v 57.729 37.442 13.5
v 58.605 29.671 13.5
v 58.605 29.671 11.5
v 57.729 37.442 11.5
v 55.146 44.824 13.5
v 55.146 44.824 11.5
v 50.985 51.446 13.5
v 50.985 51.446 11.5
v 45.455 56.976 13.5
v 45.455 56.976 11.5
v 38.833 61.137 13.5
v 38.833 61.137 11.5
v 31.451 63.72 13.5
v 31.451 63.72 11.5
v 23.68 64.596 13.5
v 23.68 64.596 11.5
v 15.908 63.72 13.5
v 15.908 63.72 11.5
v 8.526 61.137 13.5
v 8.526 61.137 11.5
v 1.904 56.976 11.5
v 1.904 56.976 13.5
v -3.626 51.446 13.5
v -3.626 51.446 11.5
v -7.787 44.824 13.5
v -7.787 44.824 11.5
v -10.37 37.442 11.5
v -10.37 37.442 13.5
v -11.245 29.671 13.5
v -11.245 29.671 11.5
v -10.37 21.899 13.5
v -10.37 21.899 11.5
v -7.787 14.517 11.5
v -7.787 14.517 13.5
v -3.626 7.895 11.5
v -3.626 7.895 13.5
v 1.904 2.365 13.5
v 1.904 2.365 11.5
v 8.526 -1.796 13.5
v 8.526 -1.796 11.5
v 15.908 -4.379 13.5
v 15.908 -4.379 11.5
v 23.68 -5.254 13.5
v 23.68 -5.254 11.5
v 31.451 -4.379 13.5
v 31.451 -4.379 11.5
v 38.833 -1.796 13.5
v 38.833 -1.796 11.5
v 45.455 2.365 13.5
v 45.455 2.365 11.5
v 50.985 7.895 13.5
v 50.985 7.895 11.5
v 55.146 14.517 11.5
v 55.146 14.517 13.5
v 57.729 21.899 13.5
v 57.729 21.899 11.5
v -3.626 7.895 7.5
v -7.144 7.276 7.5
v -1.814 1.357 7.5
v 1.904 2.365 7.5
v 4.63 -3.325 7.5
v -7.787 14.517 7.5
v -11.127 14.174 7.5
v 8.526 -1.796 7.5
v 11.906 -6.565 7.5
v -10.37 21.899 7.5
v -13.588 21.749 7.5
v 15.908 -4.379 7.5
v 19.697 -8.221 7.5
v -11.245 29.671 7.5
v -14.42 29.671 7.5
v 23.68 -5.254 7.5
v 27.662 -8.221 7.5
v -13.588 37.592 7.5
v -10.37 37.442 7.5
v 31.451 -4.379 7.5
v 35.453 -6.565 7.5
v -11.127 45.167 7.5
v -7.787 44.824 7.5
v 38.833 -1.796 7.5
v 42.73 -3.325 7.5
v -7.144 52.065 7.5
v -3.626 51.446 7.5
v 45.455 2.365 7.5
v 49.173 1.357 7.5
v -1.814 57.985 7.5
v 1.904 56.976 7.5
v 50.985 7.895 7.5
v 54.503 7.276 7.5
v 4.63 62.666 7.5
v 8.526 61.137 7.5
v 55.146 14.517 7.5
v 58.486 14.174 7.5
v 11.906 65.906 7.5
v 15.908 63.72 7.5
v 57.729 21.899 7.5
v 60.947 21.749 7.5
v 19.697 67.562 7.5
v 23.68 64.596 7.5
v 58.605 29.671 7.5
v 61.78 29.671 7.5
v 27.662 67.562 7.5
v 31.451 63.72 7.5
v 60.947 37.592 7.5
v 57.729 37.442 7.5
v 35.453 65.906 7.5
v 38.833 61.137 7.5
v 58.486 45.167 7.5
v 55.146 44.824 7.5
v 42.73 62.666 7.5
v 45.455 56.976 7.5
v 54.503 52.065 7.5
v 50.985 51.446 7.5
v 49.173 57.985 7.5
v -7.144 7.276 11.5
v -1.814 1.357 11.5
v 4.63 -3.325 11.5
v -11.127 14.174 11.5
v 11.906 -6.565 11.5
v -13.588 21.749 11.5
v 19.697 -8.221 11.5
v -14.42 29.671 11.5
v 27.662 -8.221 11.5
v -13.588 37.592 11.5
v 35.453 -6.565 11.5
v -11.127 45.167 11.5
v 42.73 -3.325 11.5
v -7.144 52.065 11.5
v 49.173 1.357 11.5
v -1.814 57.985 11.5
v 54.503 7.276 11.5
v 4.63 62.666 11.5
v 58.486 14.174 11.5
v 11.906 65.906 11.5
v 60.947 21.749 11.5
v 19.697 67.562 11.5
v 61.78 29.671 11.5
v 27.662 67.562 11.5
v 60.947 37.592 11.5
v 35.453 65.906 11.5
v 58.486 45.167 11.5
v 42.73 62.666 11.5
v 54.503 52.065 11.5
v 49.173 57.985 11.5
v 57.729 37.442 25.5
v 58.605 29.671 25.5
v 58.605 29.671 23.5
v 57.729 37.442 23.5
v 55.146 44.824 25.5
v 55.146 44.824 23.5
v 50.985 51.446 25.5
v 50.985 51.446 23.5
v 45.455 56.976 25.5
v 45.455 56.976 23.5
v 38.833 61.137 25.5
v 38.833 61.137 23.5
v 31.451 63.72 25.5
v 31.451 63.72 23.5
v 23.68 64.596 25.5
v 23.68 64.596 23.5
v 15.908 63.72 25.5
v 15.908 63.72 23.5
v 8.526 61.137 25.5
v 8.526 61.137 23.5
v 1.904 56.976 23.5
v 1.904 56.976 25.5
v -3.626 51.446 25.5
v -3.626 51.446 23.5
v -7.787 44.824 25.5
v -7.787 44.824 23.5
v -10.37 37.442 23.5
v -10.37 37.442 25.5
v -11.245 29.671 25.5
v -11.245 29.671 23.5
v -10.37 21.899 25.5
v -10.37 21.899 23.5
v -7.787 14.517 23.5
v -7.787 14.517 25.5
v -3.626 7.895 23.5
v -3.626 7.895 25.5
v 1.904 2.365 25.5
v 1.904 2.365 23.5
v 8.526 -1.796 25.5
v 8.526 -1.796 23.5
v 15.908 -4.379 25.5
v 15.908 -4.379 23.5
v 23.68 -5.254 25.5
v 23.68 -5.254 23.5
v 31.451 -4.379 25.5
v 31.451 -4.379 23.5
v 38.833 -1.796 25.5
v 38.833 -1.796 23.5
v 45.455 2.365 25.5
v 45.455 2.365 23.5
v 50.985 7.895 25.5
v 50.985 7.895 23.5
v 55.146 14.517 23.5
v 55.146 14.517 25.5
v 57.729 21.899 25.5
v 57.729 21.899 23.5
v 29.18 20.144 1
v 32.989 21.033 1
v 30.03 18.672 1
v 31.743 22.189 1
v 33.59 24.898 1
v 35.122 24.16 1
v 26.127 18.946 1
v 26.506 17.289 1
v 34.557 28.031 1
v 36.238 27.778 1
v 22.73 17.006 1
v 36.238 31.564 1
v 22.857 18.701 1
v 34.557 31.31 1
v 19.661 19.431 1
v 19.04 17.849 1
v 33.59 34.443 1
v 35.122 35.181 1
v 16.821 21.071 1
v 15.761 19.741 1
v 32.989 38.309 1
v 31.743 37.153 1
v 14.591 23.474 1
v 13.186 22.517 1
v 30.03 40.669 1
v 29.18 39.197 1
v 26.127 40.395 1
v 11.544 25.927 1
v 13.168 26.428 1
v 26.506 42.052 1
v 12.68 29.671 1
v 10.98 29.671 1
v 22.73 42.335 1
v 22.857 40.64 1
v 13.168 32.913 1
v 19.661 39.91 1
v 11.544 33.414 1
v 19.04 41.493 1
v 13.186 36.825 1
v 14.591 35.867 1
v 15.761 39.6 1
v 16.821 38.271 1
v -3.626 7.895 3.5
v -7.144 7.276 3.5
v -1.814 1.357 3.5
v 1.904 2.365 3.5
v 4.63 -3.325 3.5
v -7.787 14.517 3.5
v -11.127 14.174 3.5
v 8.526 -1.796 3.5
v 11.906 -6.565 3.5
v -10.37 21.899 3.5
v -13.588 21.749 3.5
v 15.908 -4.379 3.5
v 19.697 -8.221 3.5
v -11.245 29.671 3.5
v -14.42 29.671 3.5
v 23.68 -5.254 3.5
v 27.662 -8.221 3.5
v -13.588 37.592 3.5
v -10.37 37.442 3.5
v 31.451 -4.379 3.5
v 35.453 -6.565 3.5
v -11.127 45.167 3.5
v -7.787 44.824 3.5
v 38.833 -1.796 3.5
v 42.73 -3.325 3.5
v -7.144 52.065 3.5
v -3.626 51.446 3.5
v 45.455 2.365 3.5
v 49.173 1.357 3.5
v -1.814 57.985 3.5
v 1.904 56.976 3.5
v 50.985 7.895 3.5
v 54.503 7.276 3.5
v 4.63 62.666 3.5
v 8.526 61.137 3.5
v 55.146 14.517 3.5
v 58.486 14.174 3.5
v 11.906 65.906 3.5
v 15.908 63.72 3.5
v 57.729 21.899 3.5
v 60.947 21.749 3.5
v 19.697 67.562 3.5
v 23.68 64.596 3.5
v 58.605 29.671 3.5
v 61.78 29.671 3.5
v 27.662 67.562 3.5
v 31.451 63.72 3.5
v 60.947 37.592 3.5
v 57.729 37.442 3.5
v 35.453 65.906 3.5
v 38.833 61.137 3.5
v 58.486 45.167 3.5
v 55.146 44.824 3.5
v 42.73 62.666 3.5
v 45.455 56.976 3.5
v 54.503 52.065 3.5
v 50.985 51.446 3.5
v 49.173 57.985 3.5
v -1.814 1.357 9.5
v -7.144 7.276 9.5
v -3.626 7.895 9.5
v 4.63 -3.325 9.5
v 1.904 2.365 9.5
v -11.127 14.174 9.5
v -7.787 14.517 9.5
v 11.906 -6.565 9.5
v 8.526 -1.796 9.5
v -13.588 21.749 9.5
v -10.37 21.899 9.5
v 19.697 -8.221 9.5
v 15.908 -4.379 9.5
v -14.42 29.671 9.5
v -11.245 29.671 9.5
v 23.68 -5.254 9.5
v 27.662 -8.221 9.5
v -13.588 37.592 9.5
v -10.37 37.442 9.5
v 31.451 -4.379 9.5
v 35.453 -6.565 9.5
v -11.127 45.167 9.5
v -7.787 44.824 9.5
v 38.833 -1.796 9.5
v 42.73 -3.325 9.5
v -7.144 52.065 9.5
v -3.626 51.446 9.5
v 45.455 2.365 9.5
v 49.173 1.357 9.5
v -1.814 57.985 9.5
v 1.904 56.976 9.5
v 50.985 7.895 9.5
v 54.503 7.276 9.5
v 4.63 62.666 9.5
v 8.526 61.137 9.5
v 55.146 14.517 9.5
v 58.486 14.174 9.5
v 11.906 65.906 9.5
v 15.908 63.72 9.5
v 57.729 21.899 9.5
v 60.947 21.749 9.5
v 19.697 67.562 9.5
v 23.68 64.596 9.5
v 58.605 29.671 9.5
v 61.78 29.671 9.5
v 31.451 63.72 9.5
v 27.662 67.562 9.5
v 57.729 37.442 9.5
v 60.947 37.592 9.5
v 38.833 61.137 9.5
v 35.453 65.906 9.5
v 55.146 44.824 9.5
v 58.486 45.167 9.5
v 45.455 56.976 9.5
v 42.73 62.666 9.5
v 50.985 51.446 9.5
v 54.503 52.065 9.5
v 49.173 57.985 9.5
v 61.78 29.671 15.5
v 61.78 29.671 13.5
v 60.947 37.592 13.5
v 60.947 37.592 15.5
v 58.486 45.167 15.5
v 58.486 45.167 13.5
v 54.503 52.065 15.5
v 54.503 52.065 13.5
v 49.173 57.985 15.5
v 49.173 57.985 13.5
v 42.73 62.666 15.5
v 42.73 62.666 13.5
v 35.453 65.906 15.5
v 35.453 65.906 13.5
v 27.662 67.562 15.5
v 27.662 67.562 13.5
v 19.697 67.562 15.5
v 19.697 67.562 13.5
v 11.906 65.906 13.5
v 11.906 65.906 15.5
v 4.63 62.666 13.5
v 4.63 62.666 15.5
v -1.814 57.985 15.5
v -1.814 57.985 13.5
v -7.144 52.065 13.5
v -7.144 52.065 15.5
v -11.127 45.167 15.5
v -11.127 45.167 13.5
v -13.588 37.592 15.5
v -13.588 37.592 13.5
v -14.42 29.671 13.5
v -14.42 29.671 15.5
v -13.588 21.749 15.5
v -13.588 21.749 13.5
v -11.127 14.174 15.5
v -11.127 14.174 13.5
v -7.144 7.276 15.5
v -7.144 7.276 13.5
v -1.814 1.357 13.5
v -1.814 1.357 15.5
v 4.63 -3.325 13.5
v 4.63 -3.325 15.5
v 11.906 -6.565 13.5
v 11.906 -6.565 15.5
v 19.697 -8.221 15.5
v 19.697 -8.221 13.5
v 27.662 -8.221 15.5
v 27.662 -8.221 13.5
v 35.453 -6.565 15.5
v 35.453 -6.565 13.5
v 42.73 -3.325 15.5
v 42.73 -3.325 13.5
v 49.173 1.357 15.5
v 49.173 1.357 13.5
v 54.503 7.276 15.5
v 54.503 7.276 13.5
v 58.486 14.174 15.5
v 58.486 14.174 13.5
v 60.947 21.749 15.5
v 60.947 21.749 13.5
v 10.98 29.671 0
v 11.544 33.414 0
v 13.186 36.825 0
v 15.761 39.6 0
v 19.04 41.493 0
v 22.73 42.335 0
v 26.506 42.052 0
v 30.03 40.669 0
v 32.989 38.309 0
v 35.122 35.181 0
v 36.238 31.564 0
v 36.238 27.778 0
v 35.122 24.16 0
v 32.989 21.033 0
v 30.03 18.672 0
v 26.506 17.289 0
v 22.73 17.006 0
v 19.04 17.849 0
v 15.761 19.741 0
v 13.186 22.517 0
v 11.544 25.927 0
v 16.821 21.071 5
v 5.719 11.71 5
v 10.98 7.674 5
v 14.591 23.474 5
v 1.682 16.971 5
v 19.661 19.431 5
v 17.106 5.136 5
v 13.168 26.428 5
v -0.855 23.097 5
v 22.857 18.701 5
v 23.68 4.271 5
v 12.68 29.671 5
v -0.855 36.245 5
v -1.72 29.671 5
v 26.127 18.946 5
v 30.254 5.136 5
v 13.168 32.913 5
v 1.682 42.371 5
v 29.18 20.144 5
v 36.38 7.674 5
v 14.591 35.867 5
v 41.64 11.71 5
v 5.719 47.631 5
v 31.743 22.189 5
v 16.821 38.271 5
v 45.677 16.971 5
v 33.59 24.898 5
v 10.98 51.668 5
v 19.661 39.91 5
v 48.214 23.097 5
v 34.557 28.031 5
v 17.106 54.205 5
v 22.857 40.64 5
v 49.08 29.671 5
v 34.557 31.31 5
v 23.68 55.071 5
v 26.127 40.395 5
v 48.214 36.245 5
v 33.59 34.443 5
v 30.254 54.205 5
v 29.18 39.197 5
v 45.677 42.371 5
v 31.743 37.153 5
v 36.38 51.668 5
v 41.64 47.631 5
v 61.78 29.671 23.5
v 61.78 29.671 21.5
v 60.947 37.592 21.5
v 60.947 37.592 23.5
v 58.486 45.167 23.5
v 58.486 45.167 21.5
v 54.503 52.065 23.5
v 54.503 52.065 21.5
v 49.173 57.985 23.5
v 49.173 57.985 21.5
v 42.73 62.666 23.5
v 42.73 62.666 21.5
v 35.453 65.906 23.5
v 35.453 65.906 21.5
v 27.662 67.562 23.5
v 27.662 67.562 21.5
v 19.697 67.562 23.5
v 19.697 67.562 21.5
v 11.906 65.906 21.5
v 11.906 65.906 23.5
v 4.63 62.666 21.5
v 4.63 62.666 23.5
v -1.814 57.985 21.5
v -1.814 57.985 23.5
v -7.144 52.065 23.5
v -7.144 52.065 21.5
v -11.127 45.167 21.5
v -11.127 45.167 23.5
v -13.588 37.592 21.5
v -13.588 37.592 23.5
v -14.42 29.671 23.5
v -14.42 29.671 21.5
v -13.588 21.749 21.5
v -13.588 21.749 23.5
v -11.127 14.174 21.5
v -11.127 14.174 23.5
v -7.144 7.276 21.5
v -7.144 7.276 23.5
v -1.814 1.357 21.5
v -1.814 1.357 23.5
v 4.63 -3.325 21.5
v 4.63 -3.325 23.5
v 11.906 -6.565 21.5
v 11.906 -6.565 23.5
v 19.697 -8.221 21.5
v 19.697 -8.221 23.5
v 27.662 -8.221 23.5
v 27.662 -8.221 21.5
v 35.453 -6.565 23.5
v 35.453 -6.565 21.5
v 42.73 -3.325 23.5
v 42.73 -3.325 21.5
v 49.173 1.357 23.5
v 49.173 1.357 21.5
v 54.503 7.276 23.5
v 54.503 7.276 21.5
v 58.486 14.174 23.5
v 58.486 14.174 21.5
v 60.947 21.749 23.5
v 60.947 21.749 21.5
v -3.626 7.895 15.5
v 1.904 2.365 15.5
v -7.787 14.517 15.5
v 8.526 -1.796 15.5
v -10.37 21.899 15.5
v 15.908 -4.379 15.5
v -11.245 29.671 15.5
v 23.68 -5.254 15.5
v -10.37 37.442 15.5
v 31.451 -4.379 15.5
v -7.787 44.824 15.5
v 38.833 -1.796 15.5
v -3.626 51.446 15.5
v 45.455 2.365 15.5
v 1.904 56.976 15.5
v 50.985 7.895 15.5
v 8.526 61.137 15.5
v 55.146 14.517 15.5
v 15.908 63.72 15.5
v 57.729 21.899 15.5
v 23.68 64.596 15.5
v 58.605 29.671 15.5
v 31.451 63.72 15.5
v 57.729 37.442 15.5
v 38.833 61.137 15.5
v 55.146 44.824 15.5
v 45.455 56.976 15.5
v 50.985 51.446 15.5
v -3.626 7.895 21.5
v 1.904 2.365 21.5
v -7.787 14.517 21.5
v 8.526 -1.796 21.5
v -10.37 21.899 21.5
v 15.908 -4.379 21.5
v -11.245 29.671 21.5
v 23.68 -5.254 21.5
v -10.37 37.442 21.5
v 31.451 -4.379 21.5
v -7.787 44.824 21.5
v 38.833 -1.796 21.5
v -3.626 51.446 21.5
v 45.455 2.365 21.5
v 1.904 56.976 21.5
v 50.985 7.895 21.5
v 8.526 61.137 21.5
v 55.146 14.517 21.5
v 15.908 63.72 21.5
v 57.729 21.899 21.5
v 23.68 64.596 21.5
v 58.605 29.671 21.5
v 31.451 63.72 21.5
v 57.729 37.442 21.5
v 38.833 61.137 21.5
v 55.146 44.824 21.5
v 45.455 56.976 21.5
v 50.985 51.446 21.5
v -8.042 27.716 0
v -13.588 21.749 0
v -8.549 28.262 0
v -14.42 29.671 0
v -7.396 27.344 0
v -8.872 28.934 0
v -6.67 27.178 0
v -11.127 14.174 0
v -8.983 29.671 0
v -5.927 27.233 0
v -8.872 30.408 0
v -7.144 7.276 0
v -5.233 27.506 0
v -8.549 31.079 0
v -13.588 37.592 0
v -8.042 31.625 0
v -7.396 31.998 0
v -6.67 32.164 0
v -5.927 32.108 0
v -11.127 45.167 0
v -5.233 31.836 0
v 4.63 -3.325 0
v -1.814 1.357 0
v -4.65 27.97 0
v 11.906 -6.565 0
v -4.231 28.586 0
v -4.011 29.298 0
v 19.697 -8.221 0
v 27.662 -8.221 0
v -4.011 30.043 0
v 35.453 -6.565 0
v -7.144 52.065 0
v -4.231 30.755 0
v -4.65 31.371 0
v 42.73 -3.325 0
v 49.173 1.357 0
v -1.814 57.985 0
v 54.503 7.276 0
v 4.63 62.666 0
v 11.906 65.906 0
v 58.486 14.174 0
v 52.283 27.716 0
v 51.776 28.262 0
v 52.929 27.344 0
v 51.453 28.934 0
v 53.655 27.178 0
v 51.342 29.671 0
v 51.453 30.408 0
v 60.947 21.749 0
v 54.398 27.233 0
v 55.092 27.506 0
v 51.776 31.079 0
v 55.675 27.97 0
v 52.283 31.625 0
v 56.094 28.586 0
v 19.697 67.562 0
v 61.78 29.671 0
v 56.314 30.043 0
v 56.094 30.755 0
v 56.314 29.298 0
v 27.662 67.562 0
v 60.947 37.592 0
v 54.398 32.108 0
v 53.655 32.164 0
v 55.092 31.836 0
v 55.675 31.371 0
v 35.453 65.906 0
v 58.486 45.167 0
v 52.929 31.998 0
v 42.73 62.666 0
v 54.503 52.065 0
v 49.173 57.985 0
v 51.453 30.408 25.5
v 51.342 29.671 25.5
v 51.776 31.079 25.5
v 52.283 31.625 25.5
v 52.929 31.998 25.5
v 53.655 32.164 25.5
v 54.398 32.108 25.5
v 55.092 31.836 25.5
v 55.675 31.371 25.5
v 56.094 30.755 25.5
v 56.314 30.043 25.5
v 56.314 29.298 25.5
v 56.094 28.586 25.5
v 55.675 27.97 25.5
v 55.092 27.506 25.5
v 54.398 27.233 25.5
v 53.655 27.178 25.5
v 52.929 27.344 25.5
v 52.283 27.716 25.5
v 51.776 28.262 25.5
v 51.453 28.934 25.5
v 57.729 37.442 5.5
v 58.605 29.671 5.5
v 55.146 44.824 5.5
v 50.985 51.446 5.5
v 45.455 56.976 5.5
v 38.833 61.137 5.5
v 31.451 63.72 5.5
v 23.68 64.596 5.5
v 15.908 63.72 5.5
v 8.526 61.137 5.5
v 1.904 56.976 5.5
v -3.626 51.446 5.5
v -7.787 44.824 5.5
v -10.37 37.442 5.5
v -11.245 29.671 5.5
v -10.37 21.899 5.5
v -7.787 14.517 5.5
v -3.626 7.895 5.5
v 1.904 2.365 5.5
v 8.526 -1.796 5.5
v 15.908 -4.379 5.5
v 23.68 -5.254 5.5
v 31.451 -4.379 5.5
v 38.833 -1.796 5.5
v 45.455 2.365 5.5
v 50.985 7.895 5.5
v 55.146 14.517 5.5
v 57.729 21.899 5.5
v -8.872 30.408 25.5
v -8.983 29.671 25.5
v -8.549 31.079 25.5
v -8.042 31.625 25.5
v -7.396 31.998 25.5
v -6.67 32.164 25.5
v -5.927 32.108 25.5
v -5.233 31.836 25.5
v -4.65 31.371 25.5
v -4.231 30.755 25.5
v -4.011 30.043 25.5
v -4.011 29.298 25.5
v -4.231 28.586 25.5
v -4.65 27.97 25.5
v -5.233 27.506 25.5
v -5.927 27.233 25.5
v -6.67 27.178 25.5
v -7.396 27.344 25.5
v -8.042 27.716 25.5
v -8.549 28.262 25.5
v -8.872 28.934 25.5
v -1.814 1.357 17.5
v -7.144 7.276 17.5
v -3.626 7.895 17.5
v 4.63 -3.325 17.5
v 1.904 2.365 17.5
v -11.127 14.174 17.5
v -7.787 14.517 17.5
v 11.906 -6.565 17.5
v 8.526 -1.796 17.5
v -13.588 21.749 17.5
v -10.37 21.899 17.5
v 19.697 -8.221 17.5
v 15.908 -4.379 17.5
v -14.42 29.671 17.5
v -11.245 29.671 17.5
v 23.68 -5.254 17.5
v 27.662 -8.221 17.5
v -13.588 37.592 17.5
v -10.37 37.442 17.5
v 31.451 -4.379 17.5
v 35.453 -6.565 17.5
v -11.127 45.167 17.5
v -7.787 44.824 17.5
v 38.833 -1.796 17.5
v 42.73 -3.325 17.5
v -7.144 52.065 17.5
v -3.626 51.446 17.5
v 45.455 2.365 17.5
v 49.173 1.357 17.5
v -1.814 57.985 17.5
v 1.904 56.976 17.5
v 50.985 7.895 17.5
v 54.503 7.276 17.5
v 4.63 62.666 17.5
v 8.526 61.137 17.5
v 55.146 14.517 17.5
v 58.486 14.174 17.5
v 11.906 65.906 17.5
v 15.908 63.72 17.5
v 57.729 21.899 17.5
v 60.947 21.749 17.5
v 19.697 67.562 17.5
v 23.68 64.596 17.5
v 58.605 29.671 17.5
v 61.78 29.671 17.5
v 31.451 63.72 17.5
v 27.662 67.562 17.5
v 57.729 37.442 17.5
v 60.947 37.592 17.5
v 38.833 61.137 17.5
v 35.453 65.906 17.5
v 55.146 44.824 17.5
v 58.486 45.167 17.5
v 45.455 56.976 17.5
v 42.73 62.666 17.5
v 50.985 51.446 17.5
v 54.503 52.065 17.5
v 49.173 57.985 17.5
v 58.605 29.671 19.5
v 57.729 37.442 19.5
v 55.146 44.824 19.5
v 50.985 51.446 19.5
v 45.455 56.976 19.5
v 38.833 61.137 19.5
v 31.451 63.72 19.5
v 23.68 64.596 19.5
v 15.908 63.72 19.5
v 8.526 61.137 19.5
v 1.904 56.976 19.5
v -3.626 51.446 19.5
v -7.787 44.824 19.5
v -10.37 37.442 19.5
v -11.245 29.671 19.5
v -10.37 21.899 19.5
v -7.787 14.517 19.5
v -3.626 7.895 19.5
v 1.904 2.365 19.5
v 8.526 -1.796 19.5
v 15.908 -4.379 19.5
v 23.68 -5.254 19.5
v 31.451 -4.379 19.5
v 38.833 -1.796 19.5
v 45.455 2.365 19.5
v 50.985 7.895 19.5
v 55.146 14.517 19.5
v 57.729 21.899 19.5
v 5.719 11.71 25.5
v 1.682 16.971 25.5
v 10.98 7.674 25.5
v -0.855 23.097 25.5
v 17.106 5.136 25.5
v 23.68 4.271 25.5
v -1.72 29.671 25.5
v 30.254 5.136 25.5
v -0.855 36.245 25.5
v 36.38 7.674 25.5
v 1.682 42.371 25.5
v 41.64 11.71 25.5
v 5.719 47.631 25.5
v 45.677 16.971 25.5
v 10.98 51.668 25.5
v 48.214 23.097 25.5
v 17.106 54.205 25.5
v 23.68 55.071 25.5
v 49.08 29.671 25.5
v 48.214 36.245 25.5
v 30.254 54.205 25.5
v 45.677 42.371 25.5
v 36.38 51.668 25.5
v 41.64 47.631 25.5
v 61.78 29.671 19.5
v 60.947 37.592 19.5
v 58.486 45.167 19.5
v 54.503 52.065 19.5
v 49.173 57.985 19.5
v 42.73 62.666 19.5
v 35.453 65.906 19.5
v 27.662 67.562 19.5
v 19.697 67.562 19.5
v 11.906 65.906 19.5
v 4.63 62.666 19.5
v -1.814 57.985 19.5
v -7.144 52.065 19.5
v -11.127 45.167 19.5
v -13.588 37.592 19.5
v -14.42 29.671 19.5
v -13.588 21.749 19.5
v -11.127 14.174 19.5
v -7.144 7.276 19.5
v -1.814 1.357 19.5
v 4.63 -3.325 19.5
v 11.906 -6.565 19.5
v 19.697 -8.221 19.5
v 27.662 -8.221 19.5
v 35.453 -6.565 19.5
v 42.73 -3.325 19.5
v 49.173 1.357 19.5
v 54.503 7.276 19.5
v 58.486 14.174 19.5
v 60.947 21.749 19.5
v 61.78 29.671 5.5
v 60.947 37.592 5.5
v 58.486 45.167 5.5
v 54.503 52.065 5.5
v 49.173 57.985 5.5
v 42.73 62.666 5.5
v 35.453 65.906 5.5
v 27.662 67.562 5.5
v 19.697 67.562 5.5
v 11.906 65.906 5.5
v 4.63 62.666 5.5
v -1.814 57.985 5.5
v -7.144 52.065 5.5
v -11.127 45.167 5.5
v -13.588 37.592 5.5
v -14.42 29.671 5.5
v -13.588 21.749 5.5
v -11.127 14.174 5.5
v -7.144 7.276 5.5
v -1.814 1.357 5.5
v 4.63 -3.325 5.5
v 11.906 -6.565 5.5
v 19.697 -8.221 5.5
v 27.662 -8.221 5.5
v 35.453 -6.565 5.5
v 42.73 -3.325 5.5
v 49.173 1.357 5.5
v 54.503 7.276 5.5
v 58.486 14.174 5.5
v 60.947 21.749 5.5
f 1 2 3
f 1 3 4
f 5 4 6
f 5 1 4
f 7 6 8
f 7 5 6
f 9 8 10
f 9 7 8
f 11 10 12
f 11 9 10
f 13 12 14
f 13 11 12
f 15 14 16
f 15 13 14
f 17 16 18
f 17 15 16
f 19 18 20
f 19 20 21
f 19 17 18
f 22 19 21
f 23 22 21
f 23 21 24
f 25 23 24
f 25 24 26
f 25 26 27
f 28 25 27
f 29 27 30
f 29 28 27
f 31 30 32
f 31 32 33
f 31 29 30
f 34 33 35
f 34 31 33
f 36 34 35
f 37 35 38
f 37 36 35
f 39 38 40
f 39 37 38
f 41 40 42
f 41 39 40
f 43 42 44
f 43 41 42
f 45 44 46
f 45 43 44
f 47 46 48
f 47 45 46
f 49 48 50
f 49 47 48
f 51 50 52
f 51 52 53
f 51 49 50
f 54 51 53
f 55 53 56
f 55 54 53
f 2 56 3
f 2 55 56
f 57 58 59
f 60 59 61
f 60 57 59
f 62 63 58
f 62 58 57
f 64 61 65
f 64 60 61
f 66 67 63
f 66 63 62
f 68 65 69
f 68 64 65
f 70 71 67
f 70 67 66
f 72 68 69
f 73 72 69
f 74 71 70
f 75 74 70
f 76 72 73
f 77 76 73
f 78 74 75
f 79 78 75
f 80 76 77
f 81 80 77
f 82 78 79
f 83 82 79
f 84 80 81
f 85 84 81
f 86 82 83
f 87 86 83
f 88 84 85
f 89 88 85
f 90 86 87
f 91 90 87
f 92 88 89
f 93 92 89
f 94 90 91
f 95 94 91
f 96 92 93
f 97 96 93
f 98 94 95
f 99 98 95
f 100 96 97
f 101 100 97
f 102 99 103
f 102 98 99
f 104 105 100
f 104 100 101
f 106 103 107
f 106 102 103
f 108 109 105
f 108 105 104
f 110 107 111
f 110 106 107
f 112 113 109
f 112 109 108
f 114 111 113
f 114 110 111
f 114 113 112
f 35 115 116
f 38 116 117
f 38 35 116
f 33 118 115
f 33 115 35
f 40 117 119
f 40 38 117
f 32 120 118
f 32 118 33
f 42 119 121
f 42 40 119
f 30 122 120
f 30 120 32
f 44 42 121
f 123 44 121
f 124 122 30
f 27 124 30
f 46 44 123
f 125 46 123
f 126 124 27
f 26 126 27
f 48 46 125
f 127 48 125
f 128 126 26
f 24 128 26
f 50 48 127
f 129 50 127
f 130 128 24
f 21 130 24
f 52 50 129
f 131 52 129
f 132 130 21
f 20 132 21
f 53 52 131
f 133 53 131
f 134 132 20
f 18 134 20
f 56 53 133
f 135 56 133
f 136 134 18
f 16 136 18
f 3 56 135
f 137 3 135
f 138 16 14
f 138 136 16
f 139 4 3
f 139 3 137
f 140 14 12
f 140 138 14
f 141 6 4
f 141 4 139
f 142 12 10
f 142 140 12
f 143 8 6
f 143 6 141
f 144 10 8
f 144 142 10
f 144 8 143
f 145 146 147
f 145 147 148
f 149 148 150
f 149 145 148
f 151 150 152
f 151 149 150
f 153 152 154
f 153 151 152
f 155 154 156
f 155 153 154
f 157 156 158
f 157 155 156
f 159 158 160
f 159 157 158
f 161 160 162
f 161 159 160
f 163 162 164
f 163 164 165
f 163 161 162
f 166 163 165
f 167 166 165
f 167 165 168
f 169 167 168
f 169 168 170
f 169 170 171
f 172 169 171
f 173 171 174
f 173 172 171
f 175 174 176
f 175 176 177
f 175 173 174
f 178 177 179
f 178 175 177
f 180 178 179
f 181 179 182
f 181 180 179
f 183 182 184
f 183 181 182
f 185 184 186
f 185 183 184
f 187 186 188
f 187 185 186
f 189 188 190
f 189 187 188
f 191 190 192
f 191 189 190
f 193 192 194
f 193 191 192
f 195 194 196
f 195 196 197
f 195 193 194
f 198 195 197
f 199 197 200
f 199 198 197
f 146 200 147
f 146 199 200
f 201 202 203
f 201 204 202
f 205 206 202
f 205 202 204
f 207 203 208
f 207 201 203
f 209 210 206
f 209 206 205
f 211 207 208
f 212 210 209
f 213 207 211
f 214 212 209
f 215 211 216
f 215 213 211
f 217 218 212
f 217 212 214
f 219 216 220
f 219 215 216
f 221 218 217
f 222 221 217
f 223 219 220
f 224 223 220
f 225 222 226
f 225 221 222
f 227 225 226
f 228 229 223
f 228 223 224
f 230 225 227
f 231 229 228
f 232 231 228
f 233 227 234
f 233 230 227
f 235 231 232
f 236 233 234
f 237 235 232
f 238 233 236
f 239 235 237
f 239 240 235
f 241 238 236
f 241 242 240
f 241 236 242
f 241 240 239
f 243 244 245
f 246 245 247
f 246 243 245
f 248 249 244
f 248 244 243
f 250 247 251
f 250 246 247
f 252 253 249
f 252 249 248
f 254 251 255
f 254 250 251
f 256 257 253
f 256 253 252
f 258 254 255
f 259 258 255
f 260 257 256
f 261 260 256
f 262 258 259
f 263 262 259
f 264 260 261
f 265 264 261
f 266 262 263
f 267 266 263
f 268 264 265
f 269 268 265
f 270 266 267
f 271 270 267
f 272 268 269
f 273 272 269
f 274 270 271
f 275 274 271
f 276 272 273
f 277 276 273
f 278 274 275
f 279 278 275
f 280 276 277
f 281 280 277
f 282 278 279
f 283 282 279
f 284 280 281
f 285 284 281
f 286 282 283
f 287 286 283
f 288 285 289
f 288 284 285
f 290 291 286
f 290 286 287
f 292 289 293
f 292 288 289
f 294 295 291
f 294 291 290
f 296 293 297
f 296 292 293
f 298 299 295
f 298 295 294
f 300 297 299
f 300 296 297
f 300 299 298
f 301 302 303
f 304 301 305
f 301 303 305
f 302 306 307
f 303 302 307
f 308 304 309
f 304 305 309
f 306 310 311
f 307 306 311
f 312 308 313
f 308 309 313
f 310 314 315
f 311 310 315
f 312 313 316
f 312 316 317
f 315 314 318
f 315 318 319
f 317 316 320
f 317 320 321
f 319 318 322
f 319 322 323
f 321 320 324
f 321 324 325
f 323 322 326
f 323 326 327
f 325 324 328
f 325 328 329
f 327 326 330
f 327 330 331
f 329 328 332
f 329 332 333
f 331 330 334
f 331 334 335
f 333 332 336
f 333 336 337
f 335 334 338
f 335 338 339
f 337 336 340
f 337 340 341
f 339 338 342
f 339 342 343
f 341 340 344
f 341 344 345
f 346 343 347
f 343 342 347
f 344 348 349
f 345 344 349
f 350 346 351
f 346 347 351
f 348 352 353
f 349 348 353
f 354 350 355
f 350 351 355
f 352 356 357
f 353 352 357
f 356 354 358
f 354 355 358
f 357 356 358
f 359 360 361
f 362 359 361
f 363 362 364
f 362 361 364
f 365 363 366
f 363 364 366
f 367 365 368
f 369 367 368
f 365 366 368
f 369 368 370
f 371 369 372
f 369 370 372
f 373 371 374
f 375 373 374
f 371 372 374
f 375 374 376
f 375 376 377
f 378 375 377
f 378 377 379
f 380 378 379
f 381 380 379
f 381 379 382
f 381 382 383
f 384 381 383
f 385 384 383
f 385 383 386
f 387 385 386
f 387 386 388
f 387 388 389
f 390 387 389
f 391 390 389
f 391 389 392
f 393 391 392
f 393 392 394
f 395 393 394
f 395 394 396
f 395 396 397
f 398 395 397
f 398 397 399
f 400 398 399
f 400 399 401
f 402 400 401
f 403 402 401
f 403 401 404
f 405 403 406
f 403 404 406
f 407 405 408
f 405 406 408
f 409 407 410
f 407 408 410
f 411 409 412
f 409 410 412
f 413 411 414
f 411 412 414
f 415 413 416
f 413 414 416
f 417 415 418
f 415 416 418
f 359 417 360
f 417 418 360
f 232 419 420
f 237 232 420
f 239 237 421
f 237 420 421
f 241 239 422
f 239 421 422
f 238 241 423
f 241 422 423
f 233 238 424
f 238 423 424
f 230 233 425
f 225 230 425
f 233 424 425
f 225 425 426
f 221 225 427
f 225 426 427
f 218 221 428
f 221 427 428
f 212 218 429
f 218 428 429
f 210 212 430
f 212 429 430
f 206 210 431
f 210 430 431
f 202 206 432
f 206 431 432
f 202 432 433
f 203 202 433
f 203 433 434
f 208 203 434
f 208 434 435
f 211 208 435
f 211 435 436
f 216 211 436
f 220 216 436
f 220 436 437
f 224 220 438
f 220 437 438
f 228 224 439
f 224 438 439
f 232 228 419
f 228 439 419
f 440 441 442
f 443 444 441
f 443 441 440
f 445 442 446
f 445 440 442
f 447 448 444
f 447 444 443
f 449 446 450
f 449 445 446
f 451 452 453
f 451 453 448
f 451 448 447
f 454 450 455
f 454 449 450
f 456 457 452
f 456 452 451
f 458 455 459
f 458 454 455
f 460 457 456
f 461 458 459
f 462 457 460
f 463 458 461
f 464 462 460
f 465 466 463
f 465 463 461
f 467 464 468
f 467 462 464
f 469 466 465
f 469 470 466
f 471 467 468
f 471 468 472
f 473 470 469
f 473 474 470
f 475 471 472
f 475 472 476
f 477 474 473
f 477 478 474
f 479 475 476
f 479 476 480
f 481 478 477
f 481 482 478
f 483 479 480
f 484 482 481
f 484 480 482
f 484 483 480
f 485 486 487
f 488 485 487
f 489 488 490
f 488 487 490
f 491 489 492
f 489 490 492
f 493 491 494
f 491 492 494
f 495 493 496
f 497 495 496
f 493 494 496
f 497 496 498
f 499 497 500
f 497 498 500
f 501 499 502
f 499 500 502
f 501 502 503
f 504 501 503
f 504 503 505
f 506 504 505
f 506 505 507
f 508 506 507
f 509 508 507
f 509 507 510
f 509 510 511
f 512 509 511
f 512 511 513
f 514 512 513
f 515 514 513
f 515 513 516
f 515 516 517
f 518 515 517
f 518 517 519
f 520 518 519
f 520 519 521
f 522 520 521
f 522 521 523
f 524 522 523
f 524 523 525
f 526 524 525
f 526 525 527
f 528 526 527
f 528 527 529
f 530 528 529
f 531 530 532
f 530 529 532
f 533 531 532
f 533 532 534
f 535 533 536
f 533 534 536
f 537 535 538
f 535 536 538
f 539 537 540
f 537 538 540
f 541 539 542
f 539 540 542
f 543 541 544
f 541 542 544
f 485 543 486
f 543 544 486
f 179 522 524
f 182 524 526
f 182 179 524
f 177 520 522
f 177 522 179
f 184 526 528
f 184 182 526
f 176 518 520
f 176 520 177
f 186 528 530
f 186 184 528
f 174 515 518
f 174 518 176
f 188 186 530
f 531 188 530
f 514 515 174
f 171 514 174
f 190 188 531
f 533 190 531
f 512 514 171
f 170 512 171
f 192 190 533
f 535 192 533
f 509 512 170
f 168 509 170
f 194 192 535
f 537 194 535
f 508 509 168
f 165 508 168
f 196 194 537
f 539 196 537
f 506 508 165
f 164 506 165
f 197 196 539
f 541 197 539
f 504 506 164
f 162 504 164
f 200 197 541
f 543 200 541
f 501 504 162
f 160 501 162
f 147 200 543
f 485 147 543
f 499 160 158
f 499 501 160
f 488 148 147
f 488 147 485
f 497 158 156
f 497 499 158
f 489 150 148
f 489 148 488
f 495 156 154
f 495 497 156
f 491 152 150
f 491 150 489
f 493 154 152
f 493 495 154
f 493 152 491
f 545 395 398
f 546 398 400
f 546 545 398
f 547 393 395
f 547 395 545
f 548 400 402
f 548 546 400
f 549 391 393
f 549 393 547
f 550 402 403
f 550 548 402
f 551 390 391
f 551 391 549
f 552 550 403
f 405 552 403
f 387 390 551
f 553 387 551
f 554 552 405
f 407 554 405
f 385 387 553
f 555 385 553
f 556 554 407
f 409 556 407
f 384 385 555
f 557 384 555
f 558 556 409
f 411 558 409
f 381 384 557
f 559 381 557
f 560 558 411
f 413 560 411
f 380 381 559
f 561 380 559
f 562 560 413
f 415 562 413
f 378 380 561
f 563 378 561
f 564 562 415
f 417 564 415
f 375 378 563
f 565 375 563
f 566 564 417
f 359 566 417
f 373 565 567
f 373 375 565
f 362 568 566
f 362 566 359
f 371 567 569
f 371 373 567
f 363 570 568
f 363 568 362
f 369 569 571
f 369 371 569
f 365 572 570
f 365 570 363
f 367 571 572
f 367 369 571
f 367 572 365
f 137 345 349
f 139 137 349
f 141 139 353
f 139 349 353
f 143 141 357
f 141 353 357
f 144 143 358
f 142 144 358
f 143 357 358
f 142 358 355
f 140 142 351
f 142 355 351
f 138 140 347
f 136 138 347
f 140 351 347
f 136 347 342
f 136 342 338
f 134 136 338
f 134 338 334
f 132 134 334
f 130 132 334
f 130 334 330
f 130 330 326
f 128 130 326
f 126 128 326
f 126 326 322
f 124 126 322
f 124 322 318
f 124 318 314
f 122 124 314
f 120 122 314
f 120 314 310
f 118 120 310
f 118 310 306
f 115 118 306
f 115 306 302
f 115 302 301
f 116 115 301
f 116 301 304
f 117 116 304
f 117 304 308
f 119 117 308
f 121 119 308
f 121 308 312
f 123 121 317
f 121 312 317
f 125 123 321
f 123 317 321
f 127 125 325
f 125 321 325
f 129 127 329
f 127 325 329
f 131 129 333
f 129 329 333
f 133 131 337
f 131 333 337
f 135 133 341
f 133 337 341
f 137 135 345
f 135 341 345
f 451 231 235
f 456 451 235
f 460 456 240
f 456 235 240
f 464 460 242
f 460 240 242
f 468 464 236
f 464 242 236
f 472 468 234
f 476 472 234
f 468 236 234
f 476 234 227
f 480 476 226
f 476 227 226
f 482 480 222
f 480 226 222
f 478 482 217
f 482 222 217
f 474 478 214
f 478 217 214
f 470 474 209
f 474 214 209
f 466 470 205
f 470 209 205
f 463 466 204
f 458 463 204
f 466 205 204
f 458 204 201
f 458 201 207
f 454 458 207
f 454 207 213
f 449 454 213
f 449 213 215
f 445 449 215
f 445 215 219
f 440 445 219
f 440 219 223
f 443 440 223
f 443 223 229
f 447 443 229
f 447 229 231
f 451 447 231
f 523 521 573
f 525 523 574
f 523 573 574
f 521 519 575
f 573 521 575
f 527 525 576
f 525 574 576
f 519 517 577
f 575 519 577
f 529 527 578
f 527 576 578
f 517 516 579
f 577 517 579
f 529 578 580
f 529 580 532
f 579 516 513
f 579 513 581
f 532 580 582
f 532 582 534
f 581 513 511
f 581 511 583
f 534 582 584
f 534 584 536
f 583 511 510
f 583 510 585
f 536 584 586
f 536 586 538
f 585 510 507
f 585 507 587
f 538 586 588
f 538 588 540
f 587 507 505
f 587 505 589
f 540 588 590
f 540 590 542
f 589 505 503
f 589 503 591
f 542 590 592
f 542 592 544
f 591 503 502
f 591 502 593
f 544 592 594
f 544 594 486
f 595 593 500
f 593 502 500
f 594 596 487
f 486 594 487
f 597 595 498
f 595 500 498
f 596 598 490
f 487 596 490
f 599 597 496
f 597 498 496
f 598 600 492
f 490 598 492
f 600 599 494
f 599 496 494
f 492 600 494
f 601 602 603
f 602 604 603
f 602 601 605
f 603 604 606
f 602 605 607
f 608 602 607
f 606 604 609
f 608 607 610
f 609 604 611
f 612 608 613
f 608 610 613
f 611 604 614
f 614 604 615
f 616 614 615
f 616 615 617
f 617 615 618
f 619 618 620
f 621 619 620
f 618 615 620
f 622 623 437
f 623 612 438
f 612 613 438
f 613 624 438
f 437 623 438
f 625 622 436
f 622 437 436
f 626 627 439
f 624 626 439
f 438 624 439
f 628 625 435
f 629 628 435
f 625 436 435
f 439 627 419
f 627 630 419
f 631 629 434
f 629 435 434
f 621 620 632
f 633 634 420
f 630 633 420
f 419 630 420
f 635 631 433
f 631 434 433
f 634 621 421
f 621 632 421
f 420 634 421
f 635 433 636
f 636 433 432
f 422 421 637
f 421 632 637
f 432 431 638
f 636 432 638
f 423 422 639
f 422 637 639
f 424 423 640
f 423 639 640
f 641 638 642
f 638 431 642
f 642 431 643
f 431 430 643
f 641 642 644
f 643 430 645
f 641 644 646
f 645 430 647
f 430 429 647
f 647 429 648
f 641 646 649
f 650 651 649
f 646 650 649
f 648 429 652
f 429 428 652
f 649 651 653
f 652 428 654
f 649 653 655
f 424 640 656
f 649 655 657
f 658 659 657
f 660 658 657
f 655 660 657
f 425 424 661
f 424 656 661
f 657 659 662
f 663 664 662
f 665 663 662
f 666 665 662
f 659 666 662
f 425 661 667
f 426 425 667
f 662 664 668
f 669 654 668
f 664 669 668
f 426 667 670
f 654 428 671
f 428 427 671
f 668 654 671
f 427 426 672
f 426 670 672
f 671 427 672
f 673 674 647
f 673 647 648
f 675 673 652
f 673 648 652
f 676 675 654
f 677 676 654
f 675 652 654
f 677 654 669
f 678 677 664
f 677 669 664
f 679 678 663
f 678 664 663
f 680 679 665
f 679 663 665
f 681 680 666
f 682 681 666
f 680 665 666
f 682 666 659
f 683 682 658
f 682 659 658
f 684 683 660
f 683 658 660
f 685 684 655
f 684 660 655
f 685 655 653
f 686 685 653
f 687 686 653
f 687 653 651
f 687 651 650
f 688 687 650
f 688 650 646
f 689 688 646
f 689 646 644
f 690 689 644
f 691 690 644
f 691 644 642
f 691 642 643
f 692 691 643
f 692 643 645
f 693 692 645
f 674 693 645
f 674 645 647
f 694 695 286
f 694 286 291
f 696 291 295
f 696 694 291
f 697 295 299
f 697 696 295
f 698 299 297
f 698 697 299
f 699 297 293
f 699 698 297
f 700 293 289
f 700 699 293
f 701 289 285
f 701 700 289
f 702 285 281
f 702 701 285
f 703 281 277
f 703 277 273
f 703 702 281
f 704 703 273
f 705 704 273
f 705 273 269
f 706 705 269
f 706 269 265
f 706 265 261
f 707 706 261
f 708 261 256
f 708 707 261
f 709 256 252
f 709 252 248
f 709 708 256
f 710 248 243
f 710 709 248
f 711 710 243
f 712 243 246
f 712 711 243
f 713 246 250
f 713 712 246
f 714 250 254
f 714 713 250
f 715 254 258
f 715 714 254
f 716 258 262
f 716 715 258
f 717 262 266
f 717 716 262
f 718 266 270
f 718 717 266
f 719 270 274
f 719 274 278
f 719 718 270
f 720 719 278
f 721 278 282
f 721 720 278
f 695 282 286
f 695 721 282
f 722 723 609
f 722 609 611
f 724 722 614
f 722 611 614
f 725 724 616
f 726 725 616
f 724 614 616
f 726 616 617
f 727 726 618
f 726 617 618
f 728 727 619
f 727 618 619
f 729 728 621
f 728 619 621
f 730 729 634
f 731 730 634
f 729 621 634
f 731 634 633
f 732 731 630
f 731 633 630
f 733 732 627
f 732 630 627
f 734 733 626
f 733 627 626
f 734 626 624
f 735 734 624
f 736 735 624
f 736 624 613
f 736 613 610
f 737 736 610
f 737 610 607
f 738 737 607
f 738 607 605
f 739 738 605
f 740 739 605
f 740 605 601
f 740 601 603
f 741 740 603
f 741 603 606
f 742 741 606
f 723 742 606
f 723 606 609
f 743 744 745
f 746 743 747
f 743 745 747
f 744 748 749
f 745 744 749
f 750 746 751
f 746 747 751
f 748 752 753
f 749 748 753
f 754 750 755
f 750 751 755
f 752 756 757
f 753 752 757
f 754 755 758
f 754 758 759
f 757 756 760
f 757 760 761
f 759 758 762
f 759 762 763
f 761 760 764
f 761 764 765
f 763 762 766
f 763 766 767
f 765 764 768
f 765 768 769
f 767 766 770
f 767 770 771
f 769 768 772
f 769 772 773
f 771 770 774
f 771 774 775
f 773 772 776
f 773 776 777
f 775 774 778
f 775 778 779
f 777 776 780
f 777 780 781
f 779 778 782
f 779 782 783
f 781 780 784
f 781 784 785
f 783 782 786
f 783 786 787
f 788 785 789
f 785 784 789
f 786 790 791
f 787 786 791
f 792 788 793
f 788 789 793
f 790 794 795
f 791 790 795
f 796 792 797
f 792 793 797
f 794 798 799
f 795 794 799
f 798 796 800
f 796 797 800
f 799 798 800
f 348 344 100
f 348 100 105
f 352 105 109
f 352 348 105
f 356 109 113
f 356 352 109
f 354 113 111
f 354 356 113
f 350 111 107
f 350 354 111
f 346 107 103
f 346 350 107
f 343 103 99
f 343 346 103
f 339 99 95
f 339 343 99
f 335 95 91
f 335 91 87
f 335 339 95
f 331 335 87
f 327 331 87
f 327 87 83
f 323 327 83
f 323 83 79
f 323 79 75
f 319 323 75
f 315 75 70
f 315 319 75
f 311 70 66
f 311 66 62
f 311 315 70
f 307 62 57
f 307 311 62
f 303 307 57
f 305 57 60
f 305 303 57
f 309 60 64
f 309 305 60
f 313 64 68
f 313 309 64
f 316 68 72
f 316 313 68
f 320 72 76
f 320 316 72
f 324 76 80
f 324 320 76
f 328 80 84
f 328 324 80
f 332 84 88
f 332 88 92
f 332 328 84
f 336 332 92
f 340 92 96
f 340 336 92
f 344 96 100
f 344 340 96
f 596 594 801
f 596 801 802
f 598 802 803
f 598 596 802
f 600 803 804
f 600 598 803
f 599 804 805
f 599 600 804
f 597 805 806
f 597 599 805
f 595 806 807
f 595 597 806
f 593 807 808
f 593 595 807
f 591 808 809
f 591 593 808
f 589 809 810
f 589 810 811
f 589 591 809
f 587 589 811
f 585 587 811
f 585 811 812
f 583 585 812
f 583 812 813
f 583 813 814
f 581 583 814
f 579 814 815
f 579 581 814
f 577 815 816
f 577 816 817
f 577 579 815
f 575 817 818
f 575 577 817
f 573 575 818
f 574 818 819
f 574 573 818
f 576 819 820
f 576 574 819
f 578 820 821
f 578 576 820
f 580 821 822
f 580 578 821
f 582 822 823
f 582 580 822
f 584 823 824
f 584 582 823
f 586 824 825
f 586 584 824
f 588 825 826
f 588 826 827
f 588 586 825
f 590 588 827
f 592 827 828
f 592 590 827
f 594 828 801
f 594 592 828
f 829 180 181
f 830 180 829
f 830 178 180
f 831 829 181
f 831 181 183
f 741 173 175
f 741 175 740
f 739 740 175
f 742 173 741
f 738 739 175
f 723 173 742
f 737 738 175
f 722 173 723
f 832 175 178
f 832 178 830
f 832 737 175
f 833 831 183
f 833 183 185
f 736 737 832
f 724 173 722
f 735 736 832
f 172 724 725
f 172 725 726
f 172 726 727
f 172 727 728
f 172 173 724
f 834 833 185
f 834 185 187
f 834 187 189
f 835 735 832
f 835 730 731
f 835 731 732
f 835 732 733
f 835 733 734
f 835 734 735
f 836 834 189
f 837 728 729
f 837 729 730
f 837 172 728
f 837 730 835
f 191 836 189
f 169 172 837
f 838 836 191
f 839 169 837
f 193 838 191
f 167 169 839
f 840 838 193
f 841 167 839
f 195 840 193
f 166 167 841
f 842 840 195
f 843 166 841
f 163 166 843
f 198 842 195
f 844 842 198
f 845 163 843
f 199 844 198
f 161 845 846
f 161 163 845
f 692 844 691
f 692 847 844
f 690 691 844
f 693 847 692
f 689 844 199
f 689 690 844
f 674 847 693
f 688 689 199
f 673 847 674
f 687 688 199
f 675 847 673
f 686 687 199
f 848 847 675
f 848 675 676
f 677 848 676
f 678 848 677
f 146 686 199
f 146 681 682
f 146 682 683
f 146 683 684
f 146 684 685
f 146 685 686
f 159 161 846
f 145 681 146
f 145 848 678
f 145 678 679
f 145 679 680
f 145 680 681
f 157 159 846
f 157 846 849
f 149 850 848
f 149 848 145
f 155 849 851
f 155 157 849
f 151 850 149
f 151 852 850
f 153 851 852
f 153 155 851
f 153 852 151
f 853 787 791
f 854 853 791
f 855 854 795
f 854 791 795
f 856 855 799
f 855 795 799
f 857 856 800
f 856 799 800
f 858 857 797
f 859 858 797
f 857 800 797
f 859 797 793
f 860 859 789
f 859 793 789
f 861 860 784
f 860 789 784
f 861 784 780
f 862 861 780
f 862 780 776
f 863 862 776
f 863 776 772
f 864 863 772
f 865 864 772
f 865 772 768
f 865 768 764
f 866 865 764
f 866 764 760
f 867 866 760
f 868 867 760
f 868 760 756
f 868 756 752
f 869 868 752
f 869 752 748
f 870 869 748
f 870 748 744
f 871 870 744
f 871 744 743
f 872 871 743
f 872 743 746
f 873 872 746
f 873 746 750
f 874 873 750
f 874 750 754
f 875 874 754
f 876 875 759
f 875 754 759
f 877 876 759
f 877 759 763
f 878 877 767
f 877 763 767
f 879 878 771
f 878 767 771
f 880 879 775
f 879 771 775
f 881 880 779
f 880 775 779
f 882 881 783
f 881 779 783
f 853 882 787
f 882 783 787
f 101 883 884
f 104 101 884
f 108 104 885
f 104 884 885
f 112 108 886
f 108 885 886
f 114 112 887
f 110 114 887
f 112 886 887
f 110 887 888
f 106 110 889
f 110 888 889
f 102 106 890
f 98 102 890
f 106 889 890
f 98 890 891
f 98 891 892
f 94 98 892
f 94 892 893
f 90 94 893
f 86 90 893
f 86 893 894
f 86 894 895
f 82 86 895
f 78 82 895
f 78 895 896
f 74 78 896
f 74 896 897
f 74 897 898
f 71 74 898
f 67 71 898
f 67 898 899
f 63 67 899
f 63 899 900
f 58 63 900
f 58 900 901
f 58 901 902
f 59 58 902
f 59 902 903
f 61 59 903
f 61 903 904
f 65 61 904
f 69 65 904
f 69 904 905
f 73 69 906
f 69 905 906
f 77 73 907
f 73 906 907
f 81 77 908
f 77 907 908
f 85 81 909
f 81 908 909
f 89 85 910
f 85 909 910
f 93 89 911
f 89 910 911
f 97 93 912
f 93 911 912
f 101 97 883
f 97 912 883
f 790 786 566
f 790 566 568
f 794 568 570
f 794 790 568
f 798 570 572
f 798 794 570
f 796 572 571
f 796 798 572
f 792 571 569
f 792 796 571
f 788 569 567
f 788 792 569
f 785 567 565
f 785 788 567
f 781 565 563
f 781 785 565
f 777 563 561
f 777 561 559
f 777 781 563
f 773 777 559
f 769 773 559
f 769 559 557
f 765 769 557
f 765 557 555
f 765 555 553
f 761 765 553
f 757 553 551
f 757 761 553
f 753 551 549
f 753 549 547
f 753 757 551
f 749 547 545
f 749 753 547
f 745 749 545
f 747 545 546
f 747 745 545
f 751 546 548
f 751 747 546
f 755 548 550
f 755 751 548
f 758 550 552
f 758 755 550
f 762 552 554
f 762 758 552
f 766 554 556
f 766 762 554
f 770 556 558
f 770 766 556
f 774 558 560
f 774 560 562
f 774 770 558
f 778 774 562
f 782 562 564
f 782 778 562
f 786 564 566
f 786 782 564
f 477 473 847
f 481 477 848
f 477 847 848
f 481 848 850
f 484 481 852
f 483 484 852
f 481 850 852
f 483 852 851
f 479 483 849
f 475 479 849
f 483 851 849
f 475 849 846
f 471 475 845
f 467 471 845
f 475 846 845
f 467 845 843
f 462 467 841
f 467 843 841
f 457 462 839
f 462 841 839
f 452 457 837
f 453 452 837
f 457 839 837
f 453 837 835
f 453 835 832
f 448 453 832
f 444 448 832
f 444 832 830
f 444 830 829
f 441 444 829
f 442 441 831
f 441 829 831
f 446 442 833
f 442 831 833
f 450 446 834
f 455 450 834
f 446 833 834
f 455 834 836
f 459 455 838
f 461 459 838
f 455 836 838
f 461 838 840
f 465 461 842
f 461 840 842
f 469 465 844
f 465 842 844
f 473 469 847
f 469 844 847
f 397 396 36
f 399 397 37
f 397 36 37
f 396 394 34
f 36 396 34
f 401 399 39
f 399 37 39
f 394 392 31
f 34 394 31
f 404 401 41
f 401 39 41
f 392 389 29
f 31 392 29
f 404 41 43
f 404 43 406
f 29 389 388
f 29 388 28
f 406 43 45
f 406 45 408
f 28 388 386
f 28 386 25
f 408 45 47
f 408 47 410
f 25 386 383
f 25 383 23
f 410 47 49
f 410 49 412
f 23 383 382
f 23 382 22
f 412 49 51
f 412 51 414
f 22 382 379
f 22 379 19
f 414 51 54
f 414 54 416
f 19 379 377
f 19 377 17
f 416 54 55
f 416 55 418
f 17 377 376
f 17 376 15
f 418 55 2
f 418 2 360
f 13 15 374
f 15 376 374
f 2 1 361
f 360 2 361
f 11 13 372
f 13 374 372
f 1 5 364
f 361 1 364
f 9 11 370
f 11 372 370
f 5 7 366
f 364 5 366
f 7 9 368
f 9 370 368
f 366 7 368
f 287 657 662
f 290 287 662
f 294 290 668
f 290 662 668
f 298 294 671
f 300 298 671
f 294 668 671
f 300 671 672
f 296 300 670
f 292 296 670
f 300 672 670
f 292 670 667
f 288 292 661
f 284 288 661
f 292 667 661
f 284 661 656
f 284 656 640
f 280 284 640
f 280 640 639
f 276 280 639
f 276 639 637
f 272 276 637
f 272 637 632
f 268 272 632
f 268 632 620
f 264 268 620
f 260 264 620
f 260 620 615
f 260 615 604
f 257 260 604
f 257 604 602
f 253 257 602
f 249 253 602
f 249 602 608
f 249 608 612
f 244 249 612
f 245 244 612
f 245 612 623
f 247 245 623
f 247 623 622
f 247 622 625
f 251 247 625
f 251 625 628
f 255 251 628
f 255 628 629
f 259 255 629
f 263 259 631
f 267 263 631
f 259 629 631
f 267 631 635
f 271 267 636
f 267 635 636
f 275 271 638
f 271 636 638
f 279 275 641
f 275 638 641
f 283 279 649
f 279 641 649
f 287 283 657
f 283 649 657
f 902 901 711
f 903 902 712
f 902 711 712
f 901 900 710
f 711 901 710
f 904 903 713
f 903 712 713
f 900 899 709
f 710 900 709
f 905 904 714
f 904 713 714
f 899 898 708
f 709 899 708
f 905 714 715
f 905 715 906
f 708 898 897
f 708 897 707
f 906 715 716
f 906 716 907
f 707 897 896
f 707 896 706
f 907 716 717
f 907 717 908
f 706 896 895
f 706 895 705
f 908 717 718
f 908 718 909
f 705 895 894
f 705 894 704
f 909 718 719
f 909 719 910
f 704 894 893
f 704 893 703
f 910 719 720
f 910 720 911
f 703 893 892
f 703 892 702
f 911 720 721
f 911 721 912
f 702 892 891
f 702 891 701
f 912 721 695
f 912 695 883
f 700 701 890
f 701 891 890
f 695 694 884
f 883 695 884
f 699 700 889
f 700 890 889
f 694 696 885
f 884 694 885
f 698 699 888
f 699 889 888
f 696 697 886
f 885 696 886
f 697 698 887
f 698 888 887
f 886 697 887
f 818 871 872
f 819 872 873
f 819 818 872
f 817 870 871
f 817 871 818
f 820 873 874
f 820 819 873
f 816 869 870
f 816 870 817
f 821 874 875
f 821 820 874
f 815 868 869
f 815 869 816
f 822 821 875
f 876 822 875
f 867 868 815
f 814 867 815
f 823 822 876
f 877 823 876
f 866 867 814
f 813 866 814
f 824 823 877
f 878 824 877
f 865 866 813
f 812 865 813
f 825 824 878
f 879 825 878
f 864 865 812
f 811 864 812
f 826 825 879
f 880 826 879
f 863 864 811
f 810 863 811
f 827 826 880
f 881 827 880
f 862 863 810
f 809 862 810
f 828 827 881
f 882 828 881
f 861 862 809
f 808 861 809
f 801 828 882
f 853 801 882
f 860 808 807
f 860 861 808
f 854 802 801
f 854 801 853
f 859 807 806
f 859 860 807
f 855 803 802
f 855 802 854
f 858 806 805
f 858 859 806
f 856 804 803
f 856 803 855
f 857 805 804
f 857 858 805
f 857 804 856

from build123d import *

# Parameters (mm, degrees)
ESQUISSE1_R                = 38.1
BOSS_EXTRU_1_DEPTH         = 25.5
ESQUISSE3_R                = 25.4
ENL_V_MAT_EXTRU_2_DEPTH    = 20.5
ESQUISSE5_R                = 11
ENL_V_MAT_EXTRU_3_DEPTH    = 5
ESQUISSE7_R                = 12.7
ENL_V_MAT_EXTRU_4_DEPTH    = 1
ESQUISSE8_R                = 38.1
ESQUISSE8_R_2              = 34.925
ENL_V_MAT_EXTRU_5_DEPTH    = 2
R_P_TITION_LIN_AIRE1_COUNT = 6
R_P_TITION_LIN_AIRE1_PITCH = 4
ESQUISSE9_R                = 2.5
ENL_V_MAT_EXTRU_6_DEPTH    = 26.5


with BuildPart() as part:
    # Esquisse1 → Boss.-Extru.1 (new body)
    with BuildSketch(Plane.XY):
        with Locations((23.679503876, 29.670703652)):
            Circle(ESQUISSE1_R)
    extrude(amount=BOSS_EXTRU_1_DEPTH)

    # Esquisse3 → Enlèv. mat.-Extru.2 (cut)
    with BuildSketch(Plane.XY.offset(25.5)):
        with Locations((23.679503876, 29.670703652)):
            Circle(ESQUISSE3_R)
    extrude(amount=-ENL_V_MAT_EXTRU_2_DEPTH, mode=Mode.SUBTRACT)

    # Esquisse5 → Enlèv. mat.-Extru.3 (cut)
    with BuildSketch(Plane(origin=(0, 0, 0), x_dir=(-1, 0, 0), z_dir=(0, 0, -1))):
        with Locations((-23.679503876, 29.670703652)):
            Circle(ESQUISSE5_R)
    extrude(amount=-ENL_V_MAT_EXTRU_3_DEPTH, mode=Mode.SUBTRACT)

    # Esquisse7 → Enlèv. mat.-Extru.4 (cut)
    with BuildSketch(Plane(origin=(0, 0, 0), x_dir=(-1, 0, 0), z_dir=(0, 0, -1))):
        with Locations((-23.679503876, 29.670703652)):
            Circle(ESQUISSE7_R)
    extrude(amount=-ENL_V_MAT_EXTRU_4_DEPTH, mode=Mode.SUBTRACT)

    # Esquisse8 → Enlèv. mat.-Extru.5 (cut)
    with BuildSketch(Plane.XY.offset(25.5)):
        with Locations((23.679503876, 29.670703652)):
            Circle(ESQUISSE8_R)
        with Locations((23.679503876, 29.670703652)):
            Circle(ESQUISSE8_R_2, mode=Mode.SUBTRACT)
    enl_v_mat_extru_5 = extrude(amount=-ENL_V_MAT_EXTRU_5_DEPTH, mode=Mode.SUBTRACT)

    # Répétition linéaire1: Enlèv. mat.-Extru.5 ×6
    with Locations(*[(0, 0, -i * R_P_TITION_LIN_AIRE1_PITCH) for i in range(1, R_P_TITION_LIN_AIRE1_COUNT)]):
        add(enl_v_mat_extru_5, mode=Mode.SUBTRACT)

    # Esquisse9 → Enlèv. mat.-Extru.6 (cut, through all)
    with BuildSketch(Plane(origin=(0, 0, 0), x_dir=(-1, 0, 0), z_dir=(0, 0, -1))):
        with Locations((6.482996124, 29.670703652)):
            Circle(ESQUISSE9_R)
        with Locations((-53.842003876, 29.670703652)):
            Circle(ESQUISSE9_R)
    extrude(amount=-ENL_V_MAT_EXTRU_6_DEPTH, mode=Mode.SUBTRACT)


solid = part.part
